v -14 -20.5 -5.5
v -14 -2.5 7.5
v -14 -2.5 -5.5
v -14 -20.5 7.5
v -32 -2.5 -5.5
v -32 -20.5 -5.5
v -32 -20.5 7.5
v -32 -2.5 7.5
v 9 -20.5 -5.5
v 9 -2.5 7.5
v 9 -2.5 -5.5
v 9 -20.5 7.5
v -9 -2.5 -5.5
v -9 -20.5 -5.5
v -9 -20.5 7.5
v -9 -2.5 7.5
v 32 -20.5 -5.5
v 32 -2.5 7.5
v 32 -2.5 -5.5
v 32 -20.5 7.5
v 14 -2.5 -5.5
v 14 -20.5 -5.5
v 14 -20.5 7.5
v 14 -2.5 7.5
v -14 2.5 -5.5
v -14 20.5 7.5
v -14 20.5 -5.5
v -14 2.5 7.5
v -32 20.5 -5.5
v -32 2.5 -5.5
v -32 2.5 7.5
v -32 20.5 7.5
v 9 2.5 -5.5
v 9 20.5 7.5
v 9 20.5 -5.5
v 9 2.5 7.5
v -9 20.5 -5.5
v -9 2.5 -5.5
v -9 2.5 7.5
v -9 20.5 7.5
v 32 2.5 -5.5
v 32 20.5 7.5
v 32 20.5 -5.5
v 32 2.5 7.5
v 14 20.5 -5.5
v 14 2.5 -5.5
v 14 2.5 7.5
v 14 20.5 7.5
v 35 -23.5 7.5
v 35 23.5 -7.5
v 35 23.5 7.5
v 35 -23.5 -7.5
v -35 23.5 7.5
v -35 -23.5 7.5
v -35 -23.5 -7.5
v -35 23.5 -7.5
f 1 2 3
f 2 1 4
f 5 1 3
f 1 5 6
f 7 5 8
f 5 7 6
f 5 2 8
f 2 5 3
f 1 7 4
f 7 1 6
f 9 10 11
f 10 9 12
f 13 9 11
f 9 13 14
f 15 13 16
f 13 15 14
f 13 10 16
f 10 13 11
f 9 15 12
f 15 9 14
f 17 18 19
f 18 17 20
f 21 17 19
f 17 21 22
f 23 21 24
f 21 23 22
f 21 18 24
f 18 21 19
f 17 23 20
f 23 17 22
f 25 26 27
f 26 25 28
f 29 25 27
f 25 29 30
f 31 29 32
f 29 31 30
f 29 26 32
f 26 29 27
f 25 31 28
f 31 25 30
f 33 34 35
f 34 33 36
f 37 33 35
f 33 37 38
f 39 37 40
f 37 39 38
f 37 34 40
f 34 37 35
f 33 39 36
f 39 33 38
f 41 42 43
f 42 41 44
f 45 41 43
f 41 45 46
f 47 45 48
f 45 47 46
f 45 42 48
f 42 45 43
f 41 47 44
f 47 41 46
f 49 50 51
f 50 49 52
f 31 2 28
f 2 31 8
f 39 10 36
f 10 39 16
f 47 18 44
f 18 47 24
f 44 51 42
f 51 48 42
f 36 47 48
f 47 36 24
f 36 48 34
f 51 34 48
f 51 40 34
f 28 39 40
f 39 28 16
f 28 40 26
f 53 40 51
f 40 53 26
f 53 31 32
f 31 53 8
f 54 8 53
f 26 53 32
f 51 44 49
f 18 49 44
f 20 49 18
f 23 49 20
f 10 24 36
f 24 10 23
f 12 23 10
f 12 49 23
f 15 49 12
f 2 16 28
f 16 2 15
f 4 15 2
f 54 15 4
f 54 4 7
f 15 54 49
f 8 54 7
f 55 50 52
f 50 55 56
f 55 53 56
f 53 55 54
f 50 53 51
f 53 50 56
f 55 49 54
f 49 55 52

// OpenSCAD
$fn = 32;

// ----------------------------------------------------------------------
// Pocket plate 70 x 47 x 15
// 2 x 3 pockets 18 mm square, 13 mm deep
// ----------------------------------------------------------------------

// --- parameters (mm) ---
thickness = 15;  // plate thickness
floor_t = 2;     // material left under each pocket
pocket = 18;     // pocket side length
pitch_x = 23;    // pocket pitch along X
pitch_y = 23;    // pocket pitch along Y
cols = 3;        // pockets per row
rows = 2;        // rows of pockets

// --- derived feature positions (mm) ---
depth = thickness - floor_t;        // = 13   pocket depth, down to the floor
span_x = (cols - 1) * pitch_x;      // = 46   distance between outer pockets
span_y = (rows - 1) * pitch_y;      // = 23   distance between outer pocket rows
origin_x = -span_x / 2;             // = -23   X of the first pocket
origin_y = -span_y / 2;             // = -11.5   Y of the first pocket
plate = [span_x + pocket + 6, span_y + pocket + 6, thickness];  // = [70, 47, 15]   overall size: pockets plus 3 mm of wall on each side
feature_centers = [
  [origin_x + 0 * pitch_x, origin_y + 0 * pitch_y],
  [origin_x + 1 * pitch_x, origin_y + 0 * pitch_y],
  [origin_x + 2 * pitch_x, origin_y + 0 * pitch_y],
  [origin_x + 0 * pitch_x, origin_y + 1 * pitch_y],
  [origin_x + 1 * pitch_x, origin_y + 1 * pitch_y],
  [origin_x + 2 * pitch_x, origin_y + 1 * pitch_y]
];   // pocket centres, used verbatim by the cutter loop

// plate outline, then one pocket per centre in feature_centers
difference() {
  cube(plate, center = true);
  for (centre = feature_centers)
    translate([centre[0] - pocket / 2, centre[1] - pocket / 2, plate[2] / 2 - depth])
      cube([pocket, pocket, depth + 1]);  // centred on the declared pocket centre
}
